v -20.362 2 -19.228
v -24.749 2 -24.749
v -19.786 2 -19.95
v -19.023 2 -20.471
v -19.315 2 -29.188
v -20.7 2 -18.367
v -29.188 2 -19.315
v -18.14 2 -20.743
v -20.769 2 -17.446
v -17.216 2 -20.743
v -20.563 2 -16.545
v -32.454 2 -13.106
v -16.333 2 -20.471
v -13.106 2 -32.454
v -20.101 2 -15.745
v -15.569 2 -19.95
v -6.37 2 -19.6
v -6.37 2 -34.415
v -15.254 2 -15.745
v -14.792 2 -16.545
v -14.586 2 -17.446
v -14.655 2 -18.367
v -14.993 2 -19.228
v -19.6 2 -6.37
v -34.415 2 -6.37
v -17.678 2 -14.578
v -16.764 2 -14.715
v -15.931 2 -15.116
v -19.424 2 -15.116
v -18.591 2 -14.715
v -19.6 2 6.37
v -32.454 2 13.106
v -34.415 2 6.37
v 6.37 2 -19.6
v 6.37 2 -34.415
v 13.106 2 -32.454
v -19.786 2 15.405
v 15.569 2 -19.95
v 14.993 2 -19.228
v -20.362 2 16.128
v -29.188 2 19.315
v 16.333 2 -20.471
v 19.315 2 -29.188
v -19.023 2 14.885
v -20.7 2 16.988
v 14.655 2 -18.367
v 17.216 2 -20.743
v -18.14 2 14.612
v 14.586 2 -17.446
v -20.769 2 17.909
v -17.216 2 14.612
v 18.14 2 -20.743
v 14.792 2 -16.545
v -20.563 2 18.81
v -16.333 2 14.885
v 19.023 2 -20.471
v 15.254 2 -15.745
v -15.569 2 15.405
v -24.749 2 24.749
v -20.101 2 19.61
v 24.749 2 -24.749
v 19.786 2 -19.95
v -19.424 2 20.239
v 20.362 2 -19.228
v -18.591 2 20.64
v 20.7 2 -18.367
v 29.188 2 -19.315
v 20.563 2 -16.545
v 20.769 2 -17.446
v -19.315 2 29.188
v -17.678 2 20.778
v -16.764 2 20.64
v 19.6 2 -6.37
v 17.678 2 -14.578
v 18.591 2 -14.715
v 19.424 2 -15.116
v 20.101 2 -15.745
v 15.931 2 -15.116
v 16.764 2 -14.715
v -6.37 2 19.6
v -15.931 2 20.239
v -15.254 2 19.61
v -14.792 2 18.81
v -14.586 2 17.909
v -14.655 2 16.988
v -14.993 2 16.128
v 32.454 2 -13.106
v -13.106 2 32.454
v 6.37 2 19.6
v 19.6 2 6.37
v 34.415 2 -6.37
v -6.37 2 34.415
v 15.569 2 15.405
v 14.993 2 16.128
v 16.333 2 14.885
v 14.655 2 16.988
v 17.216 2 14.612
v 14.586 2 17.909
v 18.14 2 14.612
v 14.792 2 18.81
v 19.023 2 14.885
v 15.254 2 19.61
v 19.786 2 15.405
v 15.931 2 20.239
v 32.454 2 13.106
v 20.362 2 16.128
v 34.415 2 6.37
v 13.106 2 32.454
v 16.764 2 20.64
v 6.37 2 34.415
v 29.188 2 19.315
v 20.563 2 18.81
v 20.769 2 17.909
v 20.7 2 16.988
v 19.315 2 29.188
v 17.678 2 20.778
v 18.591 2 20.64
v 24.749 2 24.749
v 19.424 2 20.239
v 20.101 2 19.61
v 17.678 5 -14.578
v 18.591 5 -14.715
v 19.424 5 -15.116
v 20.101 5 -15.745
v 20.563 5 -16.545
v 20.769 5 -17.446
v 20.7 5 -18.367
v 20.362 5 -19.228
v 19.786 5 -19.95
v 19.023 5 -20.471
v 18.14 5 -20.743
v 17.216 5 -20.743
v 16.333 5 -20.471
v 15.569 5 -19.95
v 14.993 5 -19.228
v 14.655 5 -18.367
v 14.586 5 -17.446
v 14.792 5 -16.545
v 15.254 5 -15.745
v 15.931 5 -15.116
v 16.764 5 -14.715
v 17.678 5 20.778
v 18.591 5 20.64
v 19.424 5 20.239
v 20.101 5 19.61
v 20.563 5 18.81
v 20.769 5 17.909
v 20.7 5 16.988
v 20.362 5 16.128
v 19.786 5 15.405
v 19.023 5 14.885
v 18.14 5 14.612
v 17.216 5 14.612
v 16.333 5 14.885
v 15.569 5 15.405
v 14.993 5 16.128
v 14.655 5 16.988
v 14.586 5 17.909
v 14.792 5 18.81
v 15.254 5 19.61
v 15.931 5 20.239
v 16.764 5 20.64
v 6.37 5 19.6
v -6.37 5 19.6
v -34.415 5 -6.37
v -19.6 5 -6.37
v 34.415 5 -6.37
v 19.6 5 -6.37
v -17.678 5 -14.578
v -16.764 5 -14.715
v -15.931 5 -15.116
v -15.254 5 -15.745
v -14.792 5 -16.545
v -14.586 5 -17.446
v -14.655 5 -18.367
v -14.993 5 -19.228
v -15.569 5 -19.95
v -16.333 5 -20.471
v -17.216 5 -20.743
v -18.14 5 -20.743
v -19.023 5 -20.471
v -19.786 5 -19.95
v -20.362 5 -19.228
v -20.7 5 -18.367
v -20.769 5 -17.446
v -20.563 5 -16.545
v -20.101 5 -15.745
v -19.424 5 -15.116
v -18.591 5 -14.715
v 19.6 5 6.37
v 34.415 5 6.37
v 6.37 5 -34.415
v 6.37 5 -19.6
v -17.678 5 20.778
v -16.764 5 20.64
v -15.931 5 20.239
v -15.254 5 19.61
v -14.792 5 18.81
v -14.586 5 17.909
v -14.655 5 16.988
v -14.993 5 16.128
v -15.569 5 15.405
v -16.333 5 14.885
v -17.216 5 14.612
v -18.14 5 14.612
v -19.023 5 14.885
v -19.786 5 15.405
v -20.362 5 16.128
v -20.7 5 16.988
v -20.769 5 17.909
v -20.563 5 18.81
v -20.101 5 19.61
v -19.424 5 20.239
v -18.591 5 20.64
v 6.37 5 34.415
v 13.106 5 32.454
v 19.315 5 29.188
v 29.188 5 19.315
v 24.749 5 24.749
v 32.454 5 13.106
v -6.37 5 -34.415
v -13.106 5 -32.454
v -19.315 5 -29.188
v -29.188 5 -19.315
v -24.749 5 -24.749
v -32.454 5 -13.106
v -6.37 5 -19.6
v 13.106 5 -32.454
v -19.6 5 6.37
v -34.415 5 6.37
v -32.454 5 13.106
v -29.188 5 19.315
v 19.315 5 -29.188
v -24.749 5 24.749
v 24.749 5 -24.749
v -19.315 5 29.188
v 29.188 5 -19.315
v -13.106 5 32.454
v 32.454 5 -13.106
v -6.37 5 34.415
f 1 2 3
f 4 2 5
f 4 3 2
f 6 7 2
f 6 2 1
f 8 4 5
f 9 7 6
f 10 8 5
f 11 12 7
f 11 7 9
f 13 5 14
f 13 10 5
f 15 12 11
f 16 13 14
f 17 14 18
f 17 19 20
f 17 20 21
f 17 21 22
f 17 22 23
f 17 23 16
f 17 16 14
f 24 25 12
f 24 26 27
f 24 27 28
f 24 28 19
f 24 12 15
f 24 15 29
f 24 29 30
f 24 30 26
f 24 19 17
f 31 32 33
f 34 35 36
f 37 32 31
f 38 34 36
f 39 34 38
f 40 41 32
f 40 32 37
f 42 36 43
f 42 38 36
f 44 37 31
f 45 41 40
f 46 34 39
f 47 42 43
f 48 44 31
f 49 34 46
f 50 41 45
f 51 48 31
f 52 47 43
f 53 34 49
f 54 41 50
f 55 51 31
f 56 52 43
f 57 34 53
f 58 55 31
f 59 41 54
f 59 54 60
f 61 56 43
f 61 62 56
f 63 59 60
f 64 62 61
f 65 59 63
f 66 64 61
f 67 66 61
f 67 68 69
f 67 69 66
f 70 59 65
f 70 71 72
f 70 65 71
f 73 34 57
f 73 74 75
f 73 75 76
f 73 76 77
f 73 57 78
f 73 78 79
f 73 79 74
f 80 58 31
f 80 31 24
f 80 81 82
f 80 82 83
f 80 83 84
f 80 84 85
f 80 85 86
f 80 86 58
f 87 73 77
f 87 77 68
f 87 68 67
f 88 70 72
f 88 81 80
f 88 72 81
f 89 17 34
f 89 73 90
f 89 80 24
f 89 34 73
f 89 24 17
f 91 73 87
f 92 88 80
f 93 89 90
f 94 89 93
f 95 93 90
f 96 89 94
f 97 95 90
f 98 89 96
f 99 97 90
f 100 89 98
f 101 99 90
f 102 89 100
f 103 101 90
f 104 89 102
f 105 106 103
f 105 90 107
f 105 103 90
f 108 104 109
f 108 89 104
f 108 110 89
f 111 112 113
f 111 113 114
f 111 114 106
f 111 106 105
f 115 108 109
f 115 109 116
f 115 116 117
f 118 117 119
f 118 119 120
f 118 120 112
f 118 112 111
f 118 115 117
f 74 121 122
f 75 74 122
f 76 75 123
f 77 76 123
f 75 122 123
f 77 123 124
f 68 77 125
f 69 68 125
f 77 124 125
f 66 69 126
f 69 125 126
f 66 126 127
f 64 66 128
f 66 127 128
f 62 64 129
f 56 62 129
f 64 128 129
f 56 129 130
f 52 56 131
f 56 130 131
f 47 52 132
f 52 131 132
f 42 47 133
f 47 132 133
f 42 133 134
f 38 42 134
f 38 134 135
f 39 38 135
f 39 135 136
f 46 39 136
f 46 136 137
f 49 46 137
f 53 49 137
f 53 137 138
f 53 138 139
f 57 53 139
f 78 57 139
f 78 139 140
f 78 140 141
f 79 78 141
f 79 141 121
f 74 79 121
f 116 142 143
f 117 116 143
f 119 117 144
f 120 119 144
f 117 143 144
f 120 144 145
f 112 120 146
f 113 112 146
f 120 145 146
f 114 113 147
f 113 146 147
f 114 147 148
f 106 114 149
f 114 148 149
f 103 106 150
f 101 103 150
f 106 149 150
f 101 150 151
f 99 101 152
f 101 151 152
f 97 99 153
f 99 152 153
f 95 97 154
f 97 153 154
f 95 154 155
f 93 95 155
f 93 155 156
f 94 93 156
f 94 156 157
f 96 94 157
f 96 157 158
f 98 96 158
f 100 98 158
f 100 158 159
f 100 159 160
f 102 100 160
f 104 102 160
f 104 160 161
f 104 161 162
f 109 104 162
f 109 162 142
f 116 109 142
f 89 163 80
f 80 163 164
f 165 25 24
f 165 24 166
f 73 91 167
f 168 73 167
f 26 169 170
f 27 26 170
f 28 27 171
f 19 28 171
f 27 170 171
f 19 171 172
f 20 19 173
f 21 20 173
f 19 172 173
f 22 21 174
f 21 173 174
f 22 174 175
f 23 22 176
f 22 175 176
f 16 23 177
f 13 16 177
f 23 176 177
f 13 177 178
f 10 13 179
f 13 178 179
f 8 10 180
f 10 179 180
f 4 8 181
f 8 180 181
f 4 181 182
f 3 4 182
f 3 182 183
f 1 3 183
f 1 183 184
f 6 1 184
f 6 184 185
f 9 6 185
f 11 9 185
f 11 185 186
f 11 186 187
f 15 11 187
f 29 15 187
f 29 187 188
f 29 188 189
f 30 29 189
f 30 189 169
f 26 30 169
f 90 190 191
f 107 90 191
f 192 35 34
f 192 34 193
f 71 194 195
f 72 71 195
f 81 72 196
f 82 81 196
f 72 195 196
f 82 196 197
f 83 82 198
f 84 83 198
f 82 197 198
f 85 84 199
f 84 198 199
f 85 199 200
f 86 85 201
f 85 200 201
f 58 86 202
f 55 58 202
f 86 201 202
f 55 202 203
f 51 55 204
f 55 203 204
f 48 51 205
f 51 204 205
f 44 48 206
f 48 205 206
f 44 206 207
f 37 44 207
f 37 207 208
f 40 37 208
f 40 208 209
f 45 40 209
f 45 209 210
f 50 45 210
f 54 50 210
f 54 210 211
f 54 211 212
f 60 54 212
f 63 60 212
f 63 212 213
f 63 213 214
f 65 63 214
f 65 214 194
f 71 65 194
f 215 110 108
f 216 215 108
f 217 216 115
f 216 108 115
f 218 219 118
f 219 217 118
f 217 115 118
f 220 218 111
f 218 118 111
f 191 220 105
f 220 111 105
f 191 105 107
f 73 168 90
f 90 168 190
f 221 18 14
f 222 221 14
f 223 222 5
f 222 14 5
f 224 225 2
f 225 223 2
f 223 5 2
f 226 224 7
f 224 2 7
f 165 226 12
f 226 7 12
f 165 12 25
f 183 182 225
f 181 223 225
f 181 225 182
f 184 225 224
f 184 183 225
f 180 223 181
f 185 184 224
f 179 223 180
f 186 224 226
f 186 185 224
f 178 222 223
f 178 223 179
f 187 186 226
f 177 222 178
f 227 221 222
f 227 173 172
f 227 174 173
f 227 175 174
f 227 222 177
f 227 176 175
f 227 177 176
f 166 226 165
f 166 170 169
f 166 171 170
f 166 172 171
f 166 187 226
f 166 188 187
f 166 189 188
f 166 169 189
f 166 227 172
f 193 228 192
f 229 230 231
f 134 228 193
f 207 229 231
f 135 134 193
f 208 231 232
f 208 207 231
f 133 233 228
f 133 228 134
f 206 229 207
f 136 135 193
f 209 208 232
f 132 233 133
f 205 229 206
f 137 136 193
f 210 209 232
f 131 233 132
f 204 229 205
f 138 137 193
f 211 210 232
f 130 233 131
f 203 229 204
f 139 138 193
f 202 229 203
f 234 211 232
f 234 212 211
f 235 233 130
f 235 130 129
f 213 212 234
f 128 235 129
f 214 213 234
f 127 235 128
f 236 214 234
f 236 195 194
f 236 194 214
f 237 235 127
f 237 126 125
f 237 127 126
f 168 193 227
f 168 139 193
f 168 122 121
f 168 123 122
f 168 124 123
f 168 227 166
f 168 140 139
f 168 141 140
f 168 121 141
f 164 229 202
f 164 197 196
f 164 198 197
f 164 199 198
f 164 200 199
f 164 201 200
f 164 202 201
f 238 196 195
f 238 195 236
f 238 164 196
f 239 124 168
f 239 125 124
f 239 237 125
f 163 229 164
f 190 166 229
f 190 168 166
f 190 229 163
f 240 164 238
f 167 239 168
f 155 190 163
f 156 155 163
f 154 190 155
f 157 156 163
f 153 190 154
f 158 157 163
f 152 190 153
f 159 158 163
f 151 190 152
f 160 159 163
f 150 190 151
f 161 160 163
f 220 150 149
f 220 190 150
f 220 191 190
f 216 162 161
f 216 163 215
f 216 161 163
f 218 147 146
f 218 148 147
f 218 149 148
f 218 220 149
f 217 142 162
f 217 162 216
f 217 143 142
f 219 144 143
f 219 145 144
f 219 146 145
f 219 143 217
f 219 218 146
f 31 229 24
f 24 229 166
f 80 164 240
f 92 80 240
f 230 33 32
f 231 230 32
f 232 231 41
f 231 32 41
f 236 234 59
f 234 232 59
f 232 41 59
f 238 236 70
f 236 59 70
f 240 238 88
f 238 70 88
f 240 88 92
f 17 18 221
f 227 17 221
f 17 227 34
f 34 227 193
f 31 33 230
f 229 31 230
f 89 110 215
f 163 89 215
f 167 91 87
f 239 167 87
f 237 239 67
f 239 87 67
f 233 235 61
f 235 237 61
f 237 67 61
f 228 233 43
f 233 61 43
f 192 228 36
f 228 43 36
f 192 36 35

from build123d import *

# Parameters (mm, degrees)
SKETCH1_R           = 35
BOSS_EXTRUDE1_DEPTH = 5
SKETCH2_R           = 3.1
CUT_EXTRUDE1_DEPTH  = 50.749371855
SKETCH3_W           = 12.74
SKETCH3_H           = 10.8
CUT_EXTRUDE2_DEPTH  = 5
CIRPATTERN1_COUNT   = 4
SKETCH4_W           = 12.74
SKETCH4_H           = 5
CUT_EXTRUDE3_DEPTH  = 75.344872049
CIRPATTERN2_COUNT   = 4
CUT_EXTRUDE4_DEPTH  = 2


with BuildPart() as part:
    # Sketch1 → Boss-Extrude1 (new body)
    with BuildSketch(Plane(origin=(0, 0, 0), x_dir=(1, 0, 0), z_dir=(0, 1, 0))):
        with Locations(Location((0, 0, 0), (0, 0, 270))):
            Circle(SKETCH1_R)
    extrude(amount=BOSS_EXTRUDE1_DEPTH)

    # Sketch2 → Cut-Extrude1 (cut, through all)
    with BuildSketch(Plane(origin=(0, 5, 0), x_dir=(1, 0, 0), z_dir=(0, 1, 0))):
        with Locations(Location((-17.67766953, 17.67766953, 0), (0, 0, 270))):
            Circle(SKETCH2_R)
        with Locations(Location((17.67766953, 17.67766953, 0), (0, 0, 270))):
            Circle(SKETCH2_R)
        with Locations(Location((17.67766953, -17.67766953, 0), (0, 0, 270))):
            Circle(SKETCH2_R)
        with Locations(Location((-17.67766953, -17.67766953, 0), (0, 0, 270))):
            Circle(SKETCH2_R)
    extrude(amount=-CUT_EXTRUDE1_DEPTH, mode=Mode.SUBTRACT)

    # Sketch3 → Cut-Extrude2 (cut)
    with BuildSketch(Plane(origin=(0, 5, 0), x_dir=(1, 0, 0), z_dir=(0, 1, 0))):
        with Locations((0, 25)):
            Rectangle(SKETCH3_W, SKETCH3_H)
    cut_extrude2 = extrude(amount=-CUT_EXTRUDE2_DEPTH, mode=Mode.SUBTRACT)

    # CirPattern1: Cut-Extrude2 ×4 about axis
    cirpattern1_axis = Axis((0, 0, 0), (0, 1, 0))
    for i in range(1, CIRPATTERN1_COUNT):
        add(cut_extrude2.rotate(cirpattern1_axis, i * 360 / CIRPATTERN1_COUNT), mode=Mode.SUBTRACT)

    # Sketch4 → Cut-Extrude3 (cut, through all)
    with BuildSketch(Plane.XY.offset(-30.4)):
        with Locations((0, 2.5)):
            Rectangle(SKETCH4_W, SKETCH4_H)
    cut_extrude3 = extrude(amount=-CUT_EXTRUDE3_DEPTH, mode=Mode.SUBTRACT)

    # CirPattern2: Cut-Extrude3 ×4 about axis
    cirpattern2_axis = Axis((0, 5, 0), (0, 1, 0))
    for i in range(1, CIRPATTERN2_COUNT):
        add(cut_extrude3.rotate(cirpattern2_axis, i * 360 / CIRPATTERN2_COUNT), mode=Mode.SUBTRACT)

    # Sketch5 → Cut-Extrude4 (cut)
    with BuildSketch(Plane.XZ):
        with BuildLine():
            Line((-19.6, -6.37), (-34.415448566, -6.37))
            ThreePointArc((-34.415448566, -6.37), (-24.748737342, -24.748737342), (-6.37, -34.415448566))
            Line((-6.37, -34.415448566), (-6.37, -19.6))
            Line((-6.37, -19.6), (6.37, -19.6))
            Line((6.37, -19.6), (6.37, -34.415448566))
            ThreePointArc((6.37, -34.415448566), (24.748737342, -24.748737342), (34.415448566, -6.37))
            Line((34.415448566, -6.37), (19.6, -6.37))
            Line((19.6, -6.37), (19.6, 6.37))
            Line((19.6, 6.37), (34.415448566, 6.37))
            ThreePointArc((34.415448566, 6.37), (24.748737342, 24.748737342), (6.37, 34.415448566))
            Line((6.37, 34.415448566), (6.37, 19.6))
            Line((6.37, 19.6), (-6.37, 19.6))
            Line((-6.37, 19.6), (-6.37, 34.415448566))
            ThreePointArc((-6.37, 34.415448566), (-24.748737342, 24.748737342), (-34.415448566, 6.37))
            Line((-34.415448566, 6.37), (-19.6, 6.37))
            Line((-19.6, 6.37), (-19.6, -6.37))
        make_face()
    extrude(amount=-CUT_EXTRUDE4_DEPTH, mode=Mode.SUBTRACT)


solid = part.part
